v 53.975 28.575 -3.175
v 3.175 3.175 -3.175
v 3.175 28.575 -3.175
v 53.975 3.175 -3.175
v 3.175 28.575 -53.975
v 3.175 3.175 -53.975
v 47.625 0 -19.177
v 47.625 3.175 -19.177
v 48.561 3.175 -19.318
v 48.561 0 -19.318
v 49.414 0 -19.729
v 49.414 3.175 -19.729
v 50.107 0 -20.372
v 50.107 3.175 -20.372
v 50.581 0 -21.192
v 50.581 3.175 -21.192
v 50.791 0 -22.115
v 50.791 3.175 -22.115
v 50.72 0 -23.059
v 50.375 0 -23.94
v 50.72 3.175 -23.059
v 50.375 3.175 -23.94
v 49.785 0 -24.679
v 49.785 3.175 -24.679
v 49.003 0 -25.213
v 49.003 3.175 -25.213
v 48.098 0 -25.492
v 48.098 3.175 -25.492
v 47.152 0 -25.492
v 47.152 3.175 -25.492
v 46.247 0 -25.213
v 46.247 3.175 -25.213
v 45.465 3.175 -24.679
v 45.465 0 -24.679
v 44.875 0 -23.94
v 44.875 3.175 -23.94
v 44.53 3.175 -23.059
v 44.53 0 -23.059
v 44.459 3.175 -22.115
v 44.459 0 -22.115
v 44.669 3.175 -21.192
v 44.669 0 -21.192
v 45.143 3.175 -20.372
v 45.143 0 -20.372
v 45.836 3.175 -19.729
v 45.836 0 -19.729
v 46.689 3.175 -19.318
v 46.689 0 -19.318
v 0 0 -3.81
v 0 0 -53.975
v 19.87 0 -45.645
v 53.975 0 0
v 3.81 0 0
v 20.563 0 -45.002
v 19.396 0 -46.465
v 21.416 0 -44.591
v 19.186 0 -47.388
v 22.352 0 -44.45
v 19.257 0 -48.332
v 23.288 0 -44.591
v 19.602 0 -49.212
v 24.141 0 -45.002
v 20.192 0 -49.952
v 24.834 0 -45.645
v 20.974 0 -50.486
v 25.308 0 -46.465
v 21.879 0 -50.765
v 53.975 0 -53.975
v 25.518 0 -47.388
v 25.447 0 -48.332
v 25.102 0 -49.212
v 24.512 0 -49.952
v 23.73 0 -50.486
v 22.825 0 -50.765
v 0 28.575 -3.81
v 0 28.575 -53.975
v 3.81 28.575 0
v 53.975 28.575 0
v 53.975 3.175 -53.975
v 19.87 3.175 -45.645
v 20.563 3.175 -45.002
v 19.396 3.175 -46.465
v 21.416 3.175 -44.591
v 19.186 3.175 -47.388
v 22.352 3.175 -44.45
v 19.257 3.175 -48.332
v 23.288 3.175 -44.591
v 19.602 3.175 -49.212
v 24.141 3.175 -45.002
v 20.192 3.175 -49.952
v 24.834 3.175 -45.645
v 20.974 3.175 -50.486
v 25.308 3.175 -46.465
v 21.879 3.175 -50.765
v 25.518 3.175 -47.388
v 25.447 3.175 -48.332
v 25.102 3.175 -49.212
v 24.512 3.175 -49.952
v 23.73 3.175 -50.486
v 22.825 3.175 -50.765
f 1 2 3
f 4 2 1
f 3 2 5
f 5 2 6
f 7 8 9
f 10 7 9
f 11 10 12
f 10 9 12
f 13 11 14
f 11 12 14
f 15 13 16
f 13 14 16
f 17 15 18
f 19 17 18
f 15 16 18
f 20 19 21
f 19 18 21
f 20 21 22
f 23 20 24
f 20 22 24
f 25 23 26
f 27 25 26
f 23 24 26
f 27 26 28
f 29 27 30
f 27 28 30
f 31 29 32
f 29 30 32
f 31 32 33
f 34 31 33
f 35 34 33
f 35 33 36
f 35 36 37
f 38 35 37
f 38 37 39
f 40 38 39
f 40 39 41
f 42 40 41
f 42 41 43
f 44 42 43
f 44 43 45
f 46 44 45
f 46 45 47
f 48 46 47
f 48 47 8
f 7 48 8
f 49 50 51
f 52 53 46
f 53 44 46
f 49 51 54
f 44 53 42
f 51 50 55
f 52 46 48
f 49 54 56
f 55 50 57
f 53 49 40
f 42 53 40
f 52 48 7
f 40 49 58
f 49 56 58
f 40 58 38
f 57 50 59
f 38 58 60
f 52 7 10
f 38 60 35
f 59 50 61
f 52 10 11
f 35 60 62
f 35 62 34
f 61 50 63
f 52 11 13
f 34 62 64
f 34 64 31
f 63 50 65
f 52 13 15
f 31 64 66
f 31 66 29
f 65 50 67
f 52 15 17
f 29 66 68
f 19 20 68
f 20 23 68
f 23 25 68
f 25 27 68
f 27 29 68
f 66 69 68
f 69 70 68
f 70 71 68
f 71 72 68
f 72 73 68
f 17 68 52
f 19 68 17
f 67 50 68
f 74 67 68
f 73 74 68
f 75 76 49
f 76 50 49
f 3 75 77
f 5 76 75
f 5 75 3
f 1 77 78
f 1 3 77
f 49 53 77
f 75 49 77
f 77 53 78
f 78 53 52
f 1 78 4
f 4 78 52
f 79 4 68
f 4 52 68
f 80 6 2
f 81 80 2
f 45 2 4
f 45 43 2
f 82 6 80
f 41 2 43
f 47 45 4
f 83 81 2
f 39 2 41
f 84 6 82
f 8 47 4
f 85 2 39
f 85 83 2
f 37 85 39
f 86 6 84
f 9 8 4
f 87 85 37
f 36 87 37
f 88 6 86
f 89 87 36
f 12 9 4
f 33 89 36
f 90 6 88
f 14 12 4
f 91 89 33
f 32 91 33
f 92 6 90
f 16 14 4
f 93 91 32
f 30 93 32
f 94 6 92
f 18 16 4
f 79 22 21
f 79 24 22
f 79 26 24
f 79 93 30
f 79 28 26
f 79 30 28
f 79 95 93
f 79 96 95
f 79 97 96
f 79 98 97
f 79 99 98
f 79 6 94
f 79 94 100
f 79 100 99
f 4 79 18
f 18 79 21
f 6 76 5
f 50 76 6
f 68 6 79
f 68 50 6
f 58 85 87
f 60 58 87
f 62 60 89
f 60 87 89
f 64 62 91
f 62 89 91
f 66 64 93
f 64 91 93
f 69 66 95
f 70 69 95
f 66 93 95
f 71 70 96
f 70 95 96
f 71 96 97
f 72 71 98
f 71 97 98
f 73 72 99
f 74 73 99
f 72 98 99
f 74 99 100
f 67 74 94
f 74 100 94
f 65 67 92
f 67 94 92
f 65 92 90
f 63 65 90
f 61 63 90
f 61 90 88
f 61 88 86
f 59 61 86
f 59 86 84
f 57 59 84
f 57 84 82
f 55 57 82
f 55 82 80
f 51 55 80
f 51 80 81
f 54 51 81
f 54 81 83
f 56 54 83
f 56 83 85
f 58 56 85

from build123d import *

# Parameters (mm, degrees)
SKETCH1_W           = 53.975
SKETCH1_H           = 53.975
BOSS_EXTRUDE1_DEPTH = 3.175
SKETCH2_W           = 3.175
SKETCH2_H           = 50.8
SKETCH2_W_2         = 50.8
SKETCH2_H_2         = 3.175
BOSS_EXTRUDE2_DEPTH = 25.4
CHAMFER1_SIZE       = 3.81
SKETCH3_R           = 3.175
CUT_EXTRUDE1_DEPTH  = 25.4


with BuildPart() as part:
    # Sketch1 → Boss-Extrude1 (new body)
    with BuildSketch(Plane(origin=(0, 0, 0), x_dir=(1, 0, 0), z_dir=(0, 1, 0))):
        with Locations((26.9875, 26.9875)):
            Rectangle(SKETCH1_W, SKETCH1_H)
    extrude(amount=BOSS_EXTRUDE1_DEPTH)

    # Sketch2 → Boss-Extrude2 (add)
    with BuildSketch(Plane(origin=(0, 3.175, 0), x_dir=(1, 0, 0), z_dir=(0, 1, 0))):
        with Locations((1.5875, 28.575)):
            Rectangle(SKETCH2_W, SKETCH2_H)
        with Locations((28.575, 1.5875)):
            Rectangle(SKETCH2_W_2, SKETCH2_H_2)
        with Locations((1.5875, 1.5875)):
            Rectangle(SKETCH2_W, SKETCH2_H_2)
    extrude(amount=BOSS_EXTRUDE2_DEPTH)

    # Chamfer1
    chamfer1_edges = [part.edges().sort_by_distance(p)[0] for p in [
        (0, 14.2875, 0),
    ]]
    chamfer(chamfer1_edges, length=CHAMFER1_SIZE)

    # Sketch3 → Cut-Extrude1 (cut)
    with BuildSketch(Plane(origin=(0, 3.175, 0), x_dir=(1, 0, 0), z_dir=(0, 1, 0))):
        with Locations(Location((22.352, 47.625, 0), (0, 0, 270))):
            Circle(SKETCH3_R)
        with Locations(Location((47.625, 22.352, 0), (0, 0, 270))):
            Circle(SKETCH3_R)
    extrude(amount=-CUT_EXTRUDE1_DEPTH, mode=Mode.SUBTRACT)


solid = part.part
